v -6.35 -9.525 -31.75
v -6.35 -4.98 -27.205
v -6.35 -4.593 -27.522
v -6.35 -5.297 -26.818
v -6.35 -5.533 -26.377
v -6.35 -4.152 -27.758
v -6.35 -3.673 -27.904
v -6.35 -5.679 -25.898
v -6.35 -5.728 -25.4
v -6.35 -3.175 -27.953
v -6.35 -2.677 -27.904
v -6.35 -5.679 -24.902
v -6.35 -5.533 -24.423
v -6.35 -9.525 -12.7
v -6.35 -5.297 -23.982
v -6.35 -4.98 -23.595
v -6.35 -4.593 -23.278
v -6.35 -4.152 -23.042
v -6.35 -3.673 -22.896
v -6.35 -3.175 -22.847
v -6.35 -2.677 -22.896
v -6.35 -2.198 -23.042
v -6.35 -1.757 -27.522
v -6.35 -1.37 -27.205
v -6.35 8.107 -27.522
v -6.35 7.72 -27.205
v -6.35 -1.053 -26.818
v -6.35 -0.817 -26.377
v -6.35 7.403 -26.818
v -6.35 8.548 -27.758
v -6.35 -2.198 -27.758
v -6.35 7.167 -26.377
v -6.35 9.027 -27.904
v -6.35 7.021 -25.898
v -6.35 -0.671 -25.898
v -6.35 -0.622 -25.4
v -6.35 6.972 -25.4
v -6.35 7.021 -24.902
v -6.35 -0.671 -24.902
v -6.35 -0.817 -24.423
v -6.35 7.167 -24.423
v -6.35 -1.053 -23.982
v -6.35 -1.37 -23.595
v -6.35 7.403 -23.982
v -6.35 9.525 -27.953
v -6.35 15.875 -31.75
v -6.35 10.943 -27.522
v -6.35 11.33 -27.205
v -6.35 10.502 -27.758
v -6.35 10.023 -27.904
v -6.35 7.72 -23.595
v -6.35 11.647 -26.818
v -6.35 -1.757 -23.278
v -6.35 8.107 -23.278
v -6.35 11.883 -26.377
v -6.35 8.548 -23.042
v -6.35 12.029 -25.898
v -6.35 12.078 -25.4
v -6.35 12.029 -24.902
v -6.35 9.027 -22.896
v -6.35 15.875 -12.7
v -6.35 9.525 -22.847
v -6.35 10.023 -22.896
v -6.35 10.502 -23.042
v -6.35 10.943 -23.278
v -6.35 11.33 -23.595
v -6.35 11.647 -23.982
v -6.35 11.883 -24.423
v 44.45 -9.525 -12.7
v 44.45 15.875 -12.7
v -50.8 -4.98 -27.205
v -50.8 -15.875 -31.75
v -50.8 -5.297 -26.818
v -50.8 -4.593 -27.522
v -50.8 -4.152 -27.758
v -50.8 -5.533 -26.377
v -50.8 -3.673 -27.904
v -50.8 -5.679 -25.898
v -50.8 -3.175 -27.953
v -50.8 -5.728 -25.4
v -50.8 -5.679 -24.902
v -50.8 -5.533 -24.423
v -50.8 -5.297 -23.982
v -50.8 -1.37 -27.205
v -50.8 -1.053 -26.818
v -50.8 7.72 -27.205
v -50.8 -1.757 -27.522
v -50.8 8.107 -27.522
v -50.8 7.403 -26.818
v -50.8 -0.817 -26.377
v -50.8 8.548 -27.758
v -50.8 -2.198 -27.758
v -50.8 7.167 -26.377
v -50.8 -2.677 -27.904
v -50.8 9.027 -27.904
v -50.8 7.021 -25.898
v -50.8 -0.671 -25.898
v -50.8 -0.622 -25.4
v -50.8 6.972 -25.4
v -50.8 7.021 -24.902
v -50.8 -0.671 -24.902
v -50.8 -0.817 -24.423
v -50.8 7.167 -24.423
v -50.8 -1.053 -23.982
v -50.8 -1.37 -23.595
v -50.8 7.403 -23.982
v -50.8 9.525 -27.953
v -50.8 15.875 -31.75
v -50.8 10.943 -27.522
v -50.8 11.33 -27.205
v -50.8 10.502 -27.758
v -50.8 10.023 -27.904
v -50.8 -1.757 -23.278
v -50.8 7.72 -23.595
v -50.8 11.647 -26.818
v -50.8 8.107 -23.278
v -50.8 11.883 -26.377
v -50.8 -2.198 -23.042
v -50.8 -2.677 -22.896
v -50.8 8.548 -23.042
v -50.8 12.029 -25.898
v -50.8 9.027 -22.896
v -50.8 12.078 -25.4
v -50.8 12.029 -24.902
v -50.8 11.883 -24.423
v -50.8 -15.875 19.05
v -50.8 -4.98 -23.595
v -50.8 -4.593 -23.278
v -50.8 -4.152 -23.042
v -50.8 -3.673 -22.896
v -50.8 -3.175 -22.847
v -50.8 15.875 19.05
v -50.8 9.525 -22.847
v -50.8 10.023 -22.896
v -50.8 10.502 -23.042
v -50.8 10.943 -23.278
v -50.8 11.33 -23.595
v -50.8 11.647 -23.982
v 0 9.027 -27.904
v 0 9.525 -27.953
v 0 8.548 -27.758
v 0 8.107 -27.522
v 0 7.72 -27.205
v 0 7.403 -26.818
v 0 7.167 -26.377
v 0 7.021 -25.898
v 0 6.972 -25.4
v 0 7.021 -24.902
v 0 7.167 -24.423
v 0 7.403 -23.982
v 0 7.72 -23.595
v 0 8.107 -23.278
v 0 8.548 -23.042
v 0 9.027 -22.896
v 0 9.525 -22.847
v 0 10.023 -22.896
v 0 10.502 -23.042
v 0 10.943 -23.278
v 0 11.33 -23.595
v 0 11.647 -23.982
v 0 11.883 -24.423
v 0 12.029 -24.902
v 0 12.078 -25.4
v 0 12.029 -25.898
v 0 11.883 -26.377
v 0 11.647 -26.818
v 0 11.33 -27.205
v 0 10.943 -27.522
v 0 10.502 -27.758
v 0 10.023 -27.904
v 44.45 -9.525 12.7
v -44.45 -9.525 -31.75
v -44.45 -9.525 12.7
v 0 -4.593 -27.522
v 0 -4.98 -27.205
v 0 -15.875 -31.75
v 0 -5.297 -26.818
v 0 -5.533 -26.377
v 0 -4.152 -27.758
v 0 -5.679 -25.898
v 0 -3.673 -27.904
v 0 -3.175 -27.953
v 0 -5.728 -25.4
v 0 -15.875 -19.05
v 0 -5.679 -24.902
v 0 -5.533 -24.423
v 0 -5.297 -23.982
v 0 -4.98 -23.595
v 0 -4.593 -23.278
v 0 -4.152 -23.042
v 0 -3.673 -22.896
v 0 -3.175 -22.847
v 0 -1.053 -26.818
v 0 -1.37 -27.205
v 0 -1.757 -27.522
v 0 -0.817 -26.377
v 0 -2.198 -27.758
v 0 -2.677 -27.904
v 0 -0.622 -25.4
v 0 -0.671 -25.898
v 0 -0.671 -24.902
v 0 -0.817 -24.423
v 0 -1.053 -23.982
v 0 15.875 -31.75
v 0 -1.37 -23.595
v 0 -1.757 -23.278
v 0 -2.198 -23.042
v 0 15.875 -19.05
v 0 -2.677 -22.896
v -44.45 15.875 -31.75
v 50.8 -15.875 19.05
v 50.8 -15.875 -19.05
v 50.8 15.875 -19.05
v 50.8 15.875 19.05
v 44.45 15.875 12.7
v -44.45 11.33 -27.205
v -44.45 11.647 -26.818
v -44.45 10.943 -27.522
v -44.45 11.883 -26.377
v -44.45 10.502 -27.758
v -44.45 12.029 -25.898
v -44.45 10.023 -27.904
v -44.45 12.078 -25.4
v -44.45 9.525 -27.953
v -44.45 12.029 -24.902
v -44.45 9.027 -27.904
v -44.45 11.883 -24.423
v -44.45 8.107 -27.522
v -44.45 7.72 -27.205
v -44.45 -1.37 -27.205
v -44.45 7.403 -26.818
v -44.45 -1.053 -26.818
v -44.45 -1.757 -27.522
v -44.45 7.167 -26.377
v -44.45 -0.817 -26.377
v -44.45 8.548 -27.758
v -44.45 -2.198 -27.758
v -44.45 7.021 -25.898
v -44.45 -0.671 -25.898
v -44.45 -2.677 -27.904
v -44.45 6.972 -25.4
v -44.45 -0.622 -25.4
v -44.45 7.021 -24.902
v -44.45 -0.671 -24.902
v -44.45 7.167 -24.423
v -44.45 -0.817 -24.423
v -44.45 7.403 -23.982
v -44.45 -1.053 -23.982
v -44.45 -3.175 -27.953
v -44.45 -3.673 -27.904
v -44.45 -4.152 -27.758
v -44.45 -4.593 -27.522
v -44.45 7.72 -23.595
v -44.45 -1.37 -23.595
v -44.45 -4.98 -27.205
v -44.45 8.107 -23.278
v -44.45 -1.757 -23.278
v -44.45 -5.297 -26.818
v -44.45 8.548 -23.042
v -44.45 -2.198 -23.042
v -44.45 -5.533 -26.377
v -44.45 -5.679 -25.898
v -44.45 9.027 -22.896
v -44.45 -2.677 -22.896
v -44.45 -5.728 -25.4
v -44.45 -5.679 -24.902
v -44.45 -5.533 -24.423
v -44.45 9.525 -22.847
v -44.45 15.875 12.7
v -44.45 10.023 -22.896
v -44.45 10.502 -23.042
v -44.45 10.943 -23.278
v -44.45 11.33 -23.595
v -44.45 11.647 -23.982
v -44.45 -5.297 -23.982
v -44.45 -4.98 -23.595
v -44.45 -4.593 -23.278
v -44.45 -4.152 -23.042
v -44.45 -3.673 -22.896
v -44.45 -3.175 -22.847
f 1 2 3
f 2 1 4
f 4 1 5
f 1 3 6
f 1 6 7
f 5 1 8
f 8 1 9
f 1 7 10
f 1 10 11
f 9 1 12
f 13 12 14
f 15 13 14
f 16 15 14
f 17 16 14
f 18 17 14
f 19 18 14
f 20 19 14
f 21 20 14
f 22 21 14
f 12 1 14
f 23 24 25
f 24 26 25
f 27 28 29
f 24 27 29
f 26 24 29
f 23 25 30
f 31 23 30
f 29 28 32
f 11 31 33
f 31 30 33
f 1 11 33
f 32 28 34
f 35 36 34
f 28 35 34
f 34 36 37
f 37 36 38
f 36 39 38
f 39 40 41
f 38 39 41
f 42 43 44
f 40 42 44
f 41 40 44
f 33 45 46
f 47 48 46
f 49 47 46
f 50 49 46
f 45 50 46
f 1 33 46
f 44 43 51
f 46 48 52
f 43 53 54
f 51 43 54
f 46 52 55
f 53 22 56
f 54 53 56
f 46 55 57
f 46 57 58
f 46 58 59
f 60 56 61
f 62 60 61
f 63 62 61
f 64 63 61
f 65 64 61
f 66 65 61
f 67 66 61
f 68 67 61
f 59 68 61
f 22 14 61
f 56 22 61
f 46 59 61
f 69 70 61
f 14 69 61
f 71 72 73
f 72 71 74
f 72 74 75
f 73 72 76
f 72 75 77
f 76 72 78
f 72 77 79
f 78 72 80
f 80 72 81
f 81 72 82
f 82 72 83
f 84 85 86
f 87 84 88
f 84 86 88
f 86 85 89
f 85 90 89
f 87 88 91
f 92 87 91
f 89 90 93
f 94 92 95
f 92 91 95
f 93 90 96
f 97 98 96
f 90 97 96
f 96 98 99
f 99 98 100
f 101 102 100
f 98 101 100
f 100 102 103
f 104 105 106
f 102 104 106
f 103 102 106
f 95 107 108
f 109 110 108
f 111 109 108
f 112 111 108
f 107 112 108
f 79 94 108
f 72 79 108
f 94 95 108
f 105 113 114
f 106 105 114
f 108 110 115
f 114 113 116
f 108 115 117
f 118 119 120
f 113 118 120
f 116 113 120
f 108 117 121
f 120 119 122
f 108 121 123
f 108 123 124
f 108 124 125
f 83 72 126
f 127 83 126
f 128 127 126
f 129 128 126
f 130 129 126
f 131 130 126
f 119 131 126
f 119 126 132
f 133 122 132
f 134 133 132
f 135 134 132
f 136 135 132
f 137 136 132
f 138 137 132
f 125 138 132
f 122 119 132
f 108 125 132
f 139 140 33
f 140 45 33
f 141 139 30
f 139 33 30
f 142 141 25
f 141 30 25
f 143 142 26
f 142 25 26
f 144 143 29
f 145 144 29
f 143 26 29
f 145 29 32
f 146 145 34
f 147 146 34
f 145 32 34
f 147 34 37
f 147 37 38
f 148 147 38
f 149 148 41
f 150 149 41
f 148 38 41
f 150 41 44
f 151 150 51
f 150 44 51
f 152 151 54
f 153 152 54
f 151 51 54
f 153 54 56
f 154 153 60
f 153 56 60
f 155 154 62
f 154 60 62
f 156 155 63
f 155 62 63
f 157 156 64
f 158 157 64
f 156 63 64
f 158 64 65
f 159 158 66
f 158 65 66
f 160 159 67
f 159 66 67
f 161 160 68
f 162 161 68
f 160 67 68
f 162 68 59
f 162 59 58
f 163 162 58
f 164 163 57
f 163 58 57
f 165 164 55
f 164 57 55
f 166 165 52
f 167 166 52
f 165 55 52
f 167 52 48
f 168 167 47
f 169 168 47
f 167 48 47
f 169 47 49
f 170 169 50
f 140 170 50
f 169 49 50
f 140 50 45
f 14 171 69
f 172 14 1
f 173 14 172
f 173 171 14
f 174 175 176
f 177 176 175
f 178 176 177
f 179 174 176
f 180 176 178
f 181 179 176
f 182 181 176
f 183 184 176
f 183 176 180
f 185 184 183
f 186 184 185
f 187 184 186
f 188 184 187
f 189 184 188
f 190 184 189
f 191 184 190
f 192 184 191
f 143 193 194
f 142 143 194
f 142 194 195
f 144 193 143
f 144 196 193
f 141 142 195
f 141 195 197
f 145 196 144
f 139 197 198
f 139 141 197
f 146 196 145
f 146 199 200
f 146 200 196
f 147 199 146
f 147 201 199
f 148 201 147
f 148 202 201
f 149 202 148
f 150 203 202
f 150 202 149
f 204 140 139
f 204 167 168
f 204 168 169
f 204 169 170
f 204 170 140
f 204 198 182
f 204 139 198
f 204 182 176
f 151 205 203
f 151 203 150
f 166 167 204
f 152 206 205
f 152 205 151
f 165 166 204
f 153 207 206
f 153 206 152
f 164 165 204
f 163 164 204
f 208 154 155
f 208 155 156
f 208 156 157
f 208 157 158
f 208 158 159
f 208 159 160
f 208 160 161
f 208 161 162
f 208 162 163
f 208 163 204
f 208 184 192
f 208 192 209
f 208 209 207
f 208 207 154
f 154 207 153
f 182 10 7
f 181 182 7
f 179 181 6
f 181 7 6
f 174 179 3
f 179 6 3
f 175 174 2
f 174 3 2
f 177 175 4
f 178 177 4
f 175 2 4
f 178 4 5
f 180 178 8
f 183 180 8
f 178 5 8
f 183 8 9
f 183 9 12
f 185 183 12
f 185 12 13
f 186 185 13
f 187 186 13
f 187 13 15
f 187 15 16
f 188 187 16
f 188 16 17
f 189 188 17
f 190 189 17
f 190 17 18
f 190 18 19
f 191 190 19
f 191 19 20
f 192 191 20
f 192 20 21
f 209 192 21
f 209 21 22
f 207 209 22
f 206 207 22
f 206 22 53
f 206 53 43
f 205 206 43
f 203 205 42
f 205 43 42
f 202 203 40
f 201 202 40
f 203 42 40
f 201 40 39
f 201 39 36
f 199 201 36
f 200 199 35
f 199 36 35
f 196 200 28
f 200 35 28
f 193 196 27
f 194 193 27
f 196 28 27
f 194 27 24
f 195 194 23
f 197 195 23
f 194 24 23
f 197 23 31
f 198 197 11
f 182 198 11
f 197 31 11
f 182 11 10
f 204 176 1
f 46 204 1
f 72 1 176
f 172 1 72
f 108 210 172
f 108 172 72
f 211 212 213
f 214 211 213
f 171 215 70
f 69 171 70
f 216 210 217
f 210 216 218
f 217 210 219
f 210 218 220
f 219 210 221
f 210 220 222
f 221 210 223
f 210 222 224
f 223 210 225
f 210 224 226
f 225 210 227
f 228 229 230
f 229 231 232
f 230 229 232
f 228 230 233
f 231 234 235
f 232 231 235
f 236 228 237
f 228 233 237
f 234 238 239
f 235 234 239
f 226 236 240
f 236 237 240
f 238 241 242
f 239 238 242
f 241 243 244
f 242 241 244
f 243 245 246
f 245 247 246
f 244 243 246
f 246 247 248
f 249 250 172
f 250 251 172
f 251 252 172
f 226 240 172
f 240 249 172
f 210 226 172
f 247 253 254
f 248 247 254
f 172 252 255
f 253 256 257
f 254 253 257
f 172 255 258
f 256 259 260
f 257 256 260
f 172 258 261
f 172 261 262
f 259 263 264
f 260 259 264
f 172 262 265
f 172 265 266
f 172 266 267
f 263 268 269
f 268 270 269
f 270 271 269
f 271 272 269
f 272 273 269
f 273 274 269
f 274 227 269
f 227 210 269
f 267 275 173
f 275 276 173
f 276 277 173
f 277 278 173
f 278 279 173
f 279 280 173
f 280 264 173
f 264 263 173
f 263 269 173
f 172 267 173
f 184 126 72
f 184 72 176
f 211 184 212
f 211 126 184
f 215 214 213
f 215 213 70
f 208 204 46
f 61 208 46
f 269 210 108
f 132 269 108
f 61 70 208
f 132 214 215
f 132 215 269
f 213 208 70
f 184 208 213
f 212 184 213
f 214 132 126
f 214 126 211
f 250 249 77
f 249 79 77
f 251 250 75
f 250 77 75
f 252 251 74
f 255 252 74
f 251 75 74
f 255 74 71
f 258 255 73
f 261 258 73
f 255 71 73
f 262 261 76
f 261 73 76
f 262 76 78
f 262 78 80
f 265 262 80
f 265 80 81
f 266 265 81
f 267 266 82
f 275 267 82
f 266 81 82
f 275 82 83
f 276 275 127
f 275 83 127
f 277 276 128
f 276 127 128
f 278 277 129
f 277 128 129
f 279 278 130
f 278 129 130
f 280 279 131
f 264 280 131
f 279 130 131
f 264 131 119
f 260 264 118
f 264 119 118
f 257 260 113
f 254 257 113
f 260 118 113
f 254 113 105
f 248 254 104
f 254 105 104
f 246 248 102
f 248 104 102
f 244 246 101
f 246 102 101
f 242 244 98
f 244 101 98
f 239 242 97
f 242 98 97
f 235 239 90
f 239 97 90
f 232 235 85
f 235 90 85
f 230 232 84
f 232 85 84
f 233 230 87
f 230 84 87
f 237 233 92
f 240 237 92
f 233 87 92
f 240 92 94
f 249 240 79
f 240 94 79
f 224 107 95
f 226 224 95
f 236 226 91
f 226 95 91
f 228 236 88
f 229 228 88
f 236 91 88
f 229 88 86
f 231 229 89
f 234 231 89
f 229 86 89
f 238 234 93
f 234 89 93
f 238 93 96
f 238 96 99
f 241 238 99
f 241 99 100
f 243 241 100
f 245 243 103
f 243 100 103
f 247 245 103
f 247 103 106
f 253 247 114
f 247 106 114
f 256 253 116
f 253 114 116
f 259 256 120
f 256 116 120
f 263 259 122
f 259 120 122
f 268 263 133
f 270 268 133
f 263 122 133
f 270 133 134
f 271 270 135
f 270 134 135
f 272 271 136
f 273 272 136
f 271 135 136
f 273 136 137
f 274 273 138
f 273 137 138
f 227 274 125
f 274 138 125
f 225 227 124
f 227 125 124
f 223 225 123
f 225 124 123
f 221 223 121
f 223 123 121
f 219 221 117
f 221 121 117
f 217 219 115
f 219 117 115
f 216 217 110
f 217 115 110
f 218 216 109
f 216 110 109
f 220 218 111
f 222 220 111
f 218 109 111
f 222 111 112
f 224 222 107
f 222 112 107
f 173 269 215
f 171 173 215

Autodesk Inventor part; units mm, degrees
ref_plane "XZ Plane" through (0, 0, 0) normal (0, 1, 0) x (-1, 0, 0)
ref_plane "XY Plane" through (0, 0, 0) normal (0, 0, 1) x (1, 0, 0)
sketch "Sketch1" plane through (0, 0, 0) normal (0, 0, 1) x (1, 0, 0)
  line L0 (-50.8, -15.875) -> (50.8, -15.875)
  line L1 (50.8, -15.875) -> (50.8, 15.875)
  line L2 (50.8, 15.875) -> (-50.8, 15.875)
  line L3 (-50.8, 15.875) -> (-50.8, -15.875)
  line L4 (-50.8, -15.875) -> (50.8, 15.875) construction
  line L5 (50.8, -15.875) -> (-50.8, 15.875) construction
  point P0 (0, 0)
  dimension "d0" = 101.6
  dimension "d1" = 31.75
extrude "Extrusion1" add sketch "Sketch1" along normal mid plane 38.1
sketch "Sketch3" plane through (-50.8, 15.875, 19.05) normal (0, 1, 0) x (1, 0, 0)
  line L0 (95.25, 6.35) -> (95.25, 31.75)
  line L1 (95.25, 31.75) -> (6.35, 31.75)
  line L2 (6.35, 31.75) -> (6.35, 6.35)
  line L3 (6.35, 6.35) -> (95.25, 6.35)
  line L4 (95.25, 6.35) -> (6.35, 31.75) construction
  line L5 (95.25, 31.75) -> (6.35, 6.35) construction
  line L6 (0, 38.1) -> (0, 0) projected
  line L7 (0, 38.1) -> (101.6, 38.1) projected
  point P0 (50.8, 19.05)
  dimension "d4" = 6.35
  dimension "d5" = 6.35
extrude "Extrusion2" cut sketch "Sketch3" against normal blind 25.4
sketch "Sketch8" plane through (-44.45, 15.875, -12.7) normal (0, 0, 1) x (1, 0, 0)
  line L0 (88.9, 0) -> (0, 0) projected
  line L1 (0, 0) -> (38.1, 0)
  line L2 (38.1, 0) -> (38.1, -25.4)
  line L3 (38.1, -25.4) -> (0, -25.4)
  line L4 (0, -25.4) -> (0, 0)
  point P0 (44.45, -15.875)
  dimension "d14" = 38.1
  dimension "d15" = 25.4
extrude "Extrusion5" cut sketch "Sketch8" against normal through all
sketch "Sketch9" plane through (0, 0, -19.05) normal (0, 0, -1) x (-1, 0, 0)
  line L0 (50.8, -15.875) -> (50.8, 15.875) projected
  line L1 (50.8, 15.875) -> (50.8, -15.875)
  line L2 (50.8, -15.875) -> (0, -15.875)
  line L3 (-50.8, -15.875) -> (50.8, -15.875) projected
  line L4 (0, -15.875) -> (0, 15.875)
  line L5 (-50.8, 15.875) -> (50.8, 15.875) projected
  line L6 (6.35, -9.525) -> (6.35, 15.875) projected
  line L7 (6.35, 15.875) -> (6.35, -9.525)
  line L8 (44.45, 15.875) -> (44.45, -9.525) projected
  line L9 (6.35, -9.525) -> (44.45, -9.525)
  line L10 (44.45, -9.525) -> (44.45, 15.875)
  line L11 (44.45, 15.875) -> (50.8, 15.875)
  point P0 (0, 0)
  dimension "d18" = 50.8
extrude "Extrusion6" add sketch "Sketch9" along normal blind 12.7 contours L2 L4 L5 L6 L9 L8 L0
sketch "Sketch10" plane through (0, -15.875, -19.05) normal (1, 0, 0) x (0, 0, -1)
  line L0 (12.7, 31.75) -> (-38.1, 31.75) construction
  line L1 (6.35, 31.75) -> (6.35, 0) construction
  line L2 (-38.1, 0) -> (12.7, 0) construction
  line L3 (12.7, 31.75) -> (12.7, 0) construction
  point P0 (-19.05, 15.875)
  point P1 (6.35, 25.4)
  point P2 (6.35, 12.7)
  dimension "d21" = 6.35
  dimension "d22" = 6.35
  dimension "d32" = 12.7
hole "Hole1" at (0, 9.525, -25.4) at (0, -3.175, -25.4) direction (-1, 0, 0) diameter 5.1054 end through all clearance for "Flat Head Machine Screw (82)" size "#10" standard "Ansi Unified Screw Threads"
properties part number "hookSupport" material "PBT Plastic"
